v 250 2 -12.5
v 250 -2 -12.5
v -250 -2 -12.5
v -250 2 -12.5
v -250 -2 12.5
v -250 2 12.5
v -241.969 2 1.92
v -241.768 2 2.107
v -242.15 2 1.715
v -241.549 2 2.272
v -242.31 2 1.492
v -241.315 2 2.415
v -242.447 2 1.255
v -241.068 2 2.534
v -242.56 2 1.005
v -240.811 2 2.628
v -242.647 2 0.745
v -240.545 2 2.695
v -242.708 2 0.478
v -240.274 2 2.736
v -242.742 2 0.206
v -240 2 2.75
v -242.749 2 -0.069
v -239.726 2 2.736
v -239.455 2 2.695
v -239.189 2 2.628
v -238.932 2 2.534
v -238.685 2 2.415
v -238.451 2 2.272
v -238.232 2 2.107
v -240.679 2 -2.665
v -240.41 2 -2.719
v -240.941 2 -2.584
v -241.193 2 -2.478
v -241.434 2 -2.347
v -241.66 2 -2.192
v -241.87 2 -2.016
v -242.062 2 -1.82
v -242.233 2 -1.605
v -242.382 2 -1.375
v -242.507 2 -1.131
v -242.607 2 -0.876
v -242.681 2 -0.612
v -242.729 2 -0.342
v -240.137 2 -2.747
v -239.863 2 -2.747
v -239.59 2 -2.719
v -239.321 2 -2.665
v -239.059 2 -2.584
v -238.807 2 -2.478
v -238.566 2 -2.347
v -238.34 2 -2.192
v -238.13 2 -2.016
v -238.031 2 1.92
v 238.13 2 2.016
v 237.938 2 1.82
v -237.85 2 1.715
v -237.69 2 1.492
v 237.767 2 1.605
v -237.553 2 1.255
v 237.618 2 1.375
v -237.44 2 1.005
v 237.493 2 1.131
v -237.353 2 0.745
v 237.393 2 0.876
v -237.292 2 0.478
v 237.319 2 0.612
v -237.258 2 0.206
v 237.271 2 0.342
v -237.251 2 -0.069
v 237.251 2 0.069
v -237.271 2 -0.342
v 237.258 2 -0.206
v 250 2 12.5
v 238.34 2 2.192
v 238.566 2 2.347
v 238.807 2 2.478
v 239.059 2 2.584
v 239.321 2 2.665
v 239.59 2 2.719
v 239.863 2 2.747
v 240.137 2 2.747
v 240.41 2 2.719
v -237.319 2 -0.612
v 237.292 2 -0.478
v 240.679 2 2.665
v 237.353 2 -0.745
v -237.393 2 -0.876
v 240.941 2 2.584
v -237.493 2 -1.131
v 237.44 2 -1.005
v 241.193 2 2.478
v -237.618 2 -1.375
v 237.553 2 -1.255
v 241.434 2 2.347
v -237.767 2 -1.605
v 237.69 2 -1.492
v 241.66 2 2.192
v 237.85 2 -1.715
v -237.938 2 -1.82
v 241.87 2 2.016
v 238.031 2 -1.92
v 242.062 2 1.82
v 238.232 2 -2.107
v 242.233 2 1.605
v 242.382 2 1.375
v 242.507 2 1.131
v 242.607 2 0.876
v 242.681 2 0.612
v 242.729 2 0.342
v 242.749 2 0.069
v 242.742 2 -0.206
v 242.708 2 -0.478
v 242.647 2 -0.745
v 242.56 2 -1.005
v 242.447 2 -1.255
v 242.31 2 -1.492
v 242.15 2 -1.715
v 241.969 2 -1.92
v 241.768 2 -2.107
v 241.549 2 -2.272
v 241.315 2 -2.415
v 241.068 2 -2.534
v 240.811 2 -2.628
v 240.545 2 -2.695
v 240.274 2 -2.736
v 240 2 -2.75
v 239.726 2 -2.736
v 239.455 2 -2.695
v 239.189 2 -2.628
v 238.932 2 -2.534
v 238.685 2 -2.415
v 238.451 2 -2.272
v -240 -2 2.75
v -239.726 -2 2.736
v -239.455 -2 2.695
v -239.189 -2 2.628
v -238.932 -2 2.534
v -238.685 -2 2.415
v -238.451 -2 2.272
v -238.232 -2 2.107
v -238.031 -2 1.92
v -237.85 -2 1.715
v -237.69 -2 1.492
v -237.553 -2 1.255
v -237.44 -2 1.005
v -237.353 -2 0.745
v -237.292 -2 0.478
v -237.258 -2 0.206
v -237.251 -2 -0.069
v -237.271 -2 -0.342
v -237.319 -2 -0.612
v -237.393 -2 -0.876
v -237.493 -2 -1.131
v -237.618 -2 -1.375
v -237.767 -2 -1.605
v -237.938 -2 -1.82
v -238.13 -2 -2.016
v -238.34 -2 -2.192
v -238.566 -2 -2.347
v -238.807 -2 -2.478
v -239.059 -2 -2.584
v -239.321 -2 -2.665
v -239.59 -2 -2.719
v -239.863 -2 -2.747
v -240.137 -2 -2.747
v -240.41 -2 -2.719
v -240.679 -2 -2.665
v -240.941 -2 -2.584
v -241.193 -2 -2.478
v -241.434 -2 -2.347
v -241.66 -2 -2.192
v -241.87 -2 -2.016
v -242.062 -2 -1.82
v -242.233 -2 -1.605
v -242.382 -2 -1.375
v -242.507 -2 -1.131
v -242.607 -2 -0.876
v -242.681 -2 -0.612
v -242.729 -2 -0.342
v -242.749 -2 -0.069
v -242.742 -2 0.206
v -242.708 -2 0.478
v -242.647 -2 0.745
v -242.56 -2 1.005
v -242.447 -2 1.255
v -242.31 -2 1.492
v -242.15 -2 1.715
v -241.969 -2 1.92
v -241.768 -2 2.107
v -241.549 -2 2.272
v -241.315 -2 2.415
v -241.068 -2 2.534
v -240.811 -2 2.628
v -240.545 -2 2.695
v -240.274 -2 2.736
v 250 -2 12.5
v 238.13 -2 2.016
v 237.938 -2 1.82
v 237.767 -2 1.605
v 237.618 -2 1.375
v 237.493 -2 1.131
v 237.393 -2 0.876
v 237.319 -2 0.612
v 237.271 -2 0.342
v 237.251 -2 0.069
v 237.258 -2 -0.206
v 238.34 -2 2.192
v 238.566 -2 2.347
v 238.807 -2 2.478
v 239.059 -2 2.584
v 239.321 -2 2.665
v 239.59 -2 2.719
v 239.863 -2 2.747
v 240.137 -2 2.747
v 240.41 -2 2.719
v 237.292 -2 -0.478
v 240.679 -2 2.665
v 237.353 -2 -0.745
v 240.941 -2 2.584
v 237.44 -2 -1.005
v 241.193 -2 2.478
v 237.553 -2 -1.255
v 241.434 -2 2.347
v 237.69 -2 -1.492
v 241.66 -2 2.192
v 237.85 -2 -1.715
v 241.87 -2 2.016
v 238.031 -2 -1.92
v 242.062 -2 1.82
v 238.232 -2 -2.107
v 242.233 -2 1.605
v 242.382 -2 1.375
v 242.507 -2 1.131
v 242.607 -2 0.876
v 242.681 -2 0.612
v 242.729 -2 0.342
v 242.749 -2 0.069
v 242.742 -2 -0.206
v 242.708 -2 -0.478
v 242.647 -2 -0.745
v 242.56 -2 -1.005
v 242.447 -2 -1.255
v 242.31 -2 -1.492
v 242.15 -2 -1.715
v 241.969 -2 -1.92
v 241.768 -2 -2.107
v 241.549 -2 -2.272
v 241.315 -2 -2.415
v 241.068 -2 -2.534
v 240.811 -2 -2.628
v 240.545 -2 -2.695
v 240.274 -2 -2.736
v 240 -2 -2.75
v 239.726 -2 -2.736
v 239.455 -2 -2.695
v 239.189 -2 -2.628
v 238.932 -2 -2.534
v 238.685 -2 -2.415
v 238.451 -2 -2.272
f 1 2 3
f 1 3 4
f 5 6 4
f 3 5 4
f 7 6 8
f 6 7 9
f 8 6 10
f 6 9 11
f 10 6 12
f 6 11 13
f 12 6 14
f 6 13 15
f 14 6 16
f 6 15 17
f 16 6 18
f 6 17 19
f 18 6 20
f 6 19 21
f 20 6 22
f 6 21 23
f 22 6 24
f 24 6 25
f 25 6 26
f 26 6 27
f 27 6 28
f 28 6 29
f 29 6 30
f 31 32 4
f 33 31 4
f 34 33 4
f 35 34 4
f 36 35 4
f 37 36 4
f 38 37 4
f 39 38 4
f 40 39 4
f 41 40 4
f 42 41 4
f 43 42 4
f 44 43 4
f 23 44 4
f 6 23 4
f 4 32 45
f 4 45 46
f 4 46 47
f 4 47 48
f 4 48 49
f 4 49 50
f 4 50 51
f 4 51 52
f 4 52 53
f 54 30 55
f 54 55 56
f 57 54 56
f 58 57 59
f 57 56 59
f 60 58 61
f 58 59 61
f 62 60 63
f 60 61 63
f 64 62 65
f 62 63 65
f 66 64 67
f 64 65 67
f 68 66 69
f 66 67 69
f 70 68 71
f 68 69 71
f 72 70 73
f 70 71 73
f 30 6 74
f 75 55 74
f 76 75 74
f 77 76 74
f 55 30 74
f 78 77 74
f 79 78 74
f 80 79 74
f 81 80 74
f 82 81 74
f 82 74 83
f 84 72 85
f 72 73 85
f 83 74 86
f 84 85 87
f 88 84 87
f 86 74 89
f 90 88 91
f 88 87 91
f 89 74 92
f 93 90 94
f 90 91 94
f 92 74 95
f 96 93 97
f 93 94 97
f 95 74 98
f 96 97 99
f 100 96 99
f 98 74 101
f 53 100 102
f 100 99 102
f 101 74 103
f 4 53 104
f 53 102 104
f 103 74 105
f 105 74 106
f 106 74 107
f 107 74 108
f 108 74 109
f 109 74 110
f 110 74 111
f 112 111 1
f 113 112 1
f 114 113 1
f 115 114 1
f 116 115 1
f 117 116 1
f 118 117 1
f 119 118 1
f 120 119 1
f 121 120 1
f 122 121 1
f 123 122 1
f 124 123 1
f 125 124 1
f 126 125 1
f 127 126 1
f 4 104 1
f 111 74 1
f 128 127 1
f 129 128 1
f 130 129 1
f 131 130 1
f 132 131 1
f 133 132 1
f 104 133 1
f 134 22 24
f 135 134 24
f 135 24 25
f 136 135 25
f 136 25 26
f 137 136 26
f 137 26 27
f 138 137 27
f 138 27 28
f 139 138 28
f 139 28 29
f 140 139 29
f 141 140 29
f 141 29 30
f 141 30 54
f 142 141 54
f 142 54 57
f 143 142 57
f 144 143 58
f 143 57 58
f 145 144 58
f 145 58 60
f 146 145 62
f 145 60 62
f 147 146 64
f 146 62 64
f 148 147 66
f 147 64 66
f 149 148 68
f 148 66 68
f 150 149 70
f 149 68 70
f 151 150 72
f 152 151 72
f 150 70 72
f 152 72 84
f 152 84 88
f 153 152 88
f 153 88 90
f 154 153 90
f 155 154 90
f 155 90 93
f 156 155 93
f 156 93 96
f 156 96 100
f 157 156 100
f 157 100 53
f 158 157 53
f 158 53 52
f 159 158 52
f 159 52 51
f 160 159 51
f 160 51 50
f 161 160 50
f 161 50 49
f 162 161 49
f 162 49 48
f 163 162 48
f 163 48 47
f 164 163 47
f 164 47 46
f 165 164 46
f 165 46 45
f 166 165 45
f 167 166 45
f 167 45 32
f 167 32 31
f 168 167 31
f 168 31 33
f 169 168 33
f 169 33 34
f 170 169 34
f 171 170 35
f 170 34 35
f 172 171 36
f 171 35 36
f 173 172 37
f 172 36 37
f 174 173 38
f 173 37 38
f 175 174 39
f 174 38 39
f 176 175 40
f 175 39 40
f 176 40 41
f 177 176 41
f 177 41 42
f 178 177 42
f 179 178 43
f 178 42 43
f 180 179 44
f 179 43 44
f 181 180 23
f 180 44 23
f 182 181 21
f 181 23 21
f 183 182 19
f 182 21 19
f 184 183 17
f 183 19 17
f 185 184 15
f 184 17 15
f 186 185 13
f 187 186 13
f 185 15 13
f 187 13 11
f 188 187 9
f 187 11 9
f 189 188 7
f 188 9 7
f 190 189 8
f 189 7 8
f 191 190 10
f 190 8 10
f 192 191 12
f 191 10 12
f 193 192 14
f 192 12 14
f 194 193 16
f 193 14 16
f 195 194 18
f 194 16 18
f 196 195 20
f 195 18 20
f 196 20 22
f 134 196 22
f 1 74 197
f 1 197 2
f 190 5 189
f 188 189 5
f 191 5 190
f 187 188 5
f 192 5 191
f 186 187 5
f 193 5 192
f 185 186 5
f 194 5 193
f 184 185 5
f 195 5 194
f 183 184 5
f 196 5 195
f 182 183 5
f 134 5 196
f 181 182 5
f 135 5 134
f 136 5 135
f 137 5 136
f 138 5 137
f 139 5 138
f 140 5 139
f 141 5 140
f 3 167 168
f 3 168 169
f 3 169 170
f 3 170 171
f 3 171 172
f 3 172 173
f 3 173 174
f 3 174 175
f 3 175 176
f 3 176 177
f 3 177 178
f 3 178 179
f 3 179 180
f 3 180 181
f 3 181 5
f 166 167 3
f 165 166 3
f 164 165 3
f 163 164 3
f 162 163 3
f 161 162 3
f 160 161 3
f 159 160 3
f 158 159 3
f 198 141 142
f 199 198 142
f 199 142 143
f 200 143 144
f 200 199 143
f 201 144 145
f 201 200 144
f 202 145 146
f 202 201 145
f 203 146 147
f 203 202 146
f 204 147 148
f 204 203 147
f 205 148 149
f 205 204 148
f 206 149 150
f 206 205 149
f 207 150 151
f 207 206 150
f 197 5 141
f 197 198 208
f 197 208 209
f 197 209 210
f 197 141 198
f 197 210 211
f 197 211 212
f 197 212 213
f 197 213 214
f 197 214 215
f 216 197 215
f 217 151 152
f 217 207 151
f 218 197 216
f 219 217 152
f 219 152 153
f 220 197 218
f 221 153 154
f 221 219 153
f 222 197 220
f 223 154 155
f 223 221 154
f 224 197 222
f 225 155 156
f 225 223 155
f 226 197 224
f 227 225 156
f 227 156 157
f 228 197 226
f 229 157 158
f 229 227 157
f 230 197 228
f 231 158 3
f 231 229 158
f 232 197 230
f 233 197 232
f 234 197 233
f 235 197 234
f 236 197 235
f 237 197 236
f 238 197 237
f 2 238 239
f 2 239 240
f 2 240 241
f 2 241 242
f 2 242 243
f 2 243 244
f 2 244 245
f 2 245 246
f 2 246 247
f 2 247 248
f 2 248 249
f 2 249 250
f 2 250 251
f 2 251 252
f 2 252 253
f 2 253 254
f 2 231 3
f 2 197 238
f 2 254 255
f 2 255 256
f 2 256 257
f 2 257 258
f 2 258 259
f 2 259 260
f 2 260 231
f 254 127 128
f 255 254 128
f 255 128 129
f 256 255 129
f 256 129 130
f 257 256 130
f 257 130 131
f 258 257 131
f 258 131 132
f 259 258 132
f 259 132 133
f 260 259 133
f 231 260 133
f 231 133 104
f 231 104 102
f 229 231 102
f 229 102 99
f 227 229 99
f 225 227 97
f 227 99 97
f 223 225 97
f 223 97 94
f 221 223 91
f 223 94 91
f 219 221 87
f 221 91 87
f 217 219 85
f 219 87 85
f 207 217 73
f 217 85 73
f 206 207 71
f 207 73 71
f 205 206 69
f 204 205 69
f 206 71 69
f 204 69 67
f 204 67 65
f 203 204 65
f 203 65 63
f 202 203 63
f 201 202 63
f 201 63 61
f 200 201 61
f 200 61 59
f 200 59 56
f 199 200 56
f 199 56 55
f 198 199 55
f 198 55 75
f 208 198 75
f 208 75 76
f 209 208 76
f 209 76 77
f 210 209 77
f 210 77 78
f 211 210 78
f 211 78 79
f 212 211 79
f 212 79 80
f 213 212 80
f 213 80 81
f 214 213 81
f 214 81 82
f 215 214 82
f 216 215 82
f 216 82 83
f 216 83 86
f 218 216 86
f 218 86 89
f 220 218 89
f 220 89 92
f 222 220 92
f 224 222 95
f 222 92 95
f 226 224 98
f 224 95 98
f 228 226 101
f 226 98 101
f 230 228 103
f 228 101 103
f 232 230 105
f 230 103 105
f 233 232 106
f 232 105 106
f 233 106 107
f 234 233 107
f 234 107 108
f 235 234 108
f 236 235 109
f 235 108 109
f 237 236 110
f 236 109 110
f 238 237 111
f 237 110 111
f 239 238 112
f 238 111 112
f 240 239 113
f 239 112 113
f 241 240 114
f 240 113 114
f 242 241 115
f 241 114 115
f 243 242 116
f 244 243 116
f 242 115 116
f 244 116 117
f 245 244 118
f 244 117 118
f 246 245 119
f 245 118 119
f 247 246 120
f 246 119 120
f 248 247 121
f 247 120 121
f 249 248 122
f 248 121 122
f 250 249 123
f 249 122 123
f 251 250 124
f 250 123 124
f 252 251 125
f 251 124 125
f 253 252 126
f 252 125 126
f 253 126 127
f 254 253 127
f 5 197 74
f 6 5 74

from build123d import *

# Parameters (mm, degrees)
SKETCH1_W           = 25
SKETCH1_H           = 4
BOSS_EXTRUDE1_DEPTH = 250
SKETCH2_R           = 2.75
CUT_EXTRUDE1_DEPTH  = 251.344262966


with BuildPart() as part:
    # Sketch1 → Boss-Extrude1 (new, symmetric)
    with BuildSketch(Plane(origin=(0, 0, 0), x_dir=(0, 0, -1), z_dir=(1, 0, 0))):
        Rectangle(SKETCH1_W, SKETCH1_H)
    extrude(amount=BOSS_EXTRUDE1_DEPTH, both=True)

    # Sketch2 → Cut-Extrude1 (cut, through all)
    with BuildSketch(Plane(origin=(0, 2, 0), x_dir=(1, 0, 0), z_dir=(0, 1, 0))):
        with Locations(Location((-240, 0, 0), (0, 0, 270))):
            Circle(SKETCH2_R)
        with Locations(Location((240, 0, 0), (0, 0, 90))):
            Circle(SKETCH2_R)
    extrude(amount=-CUT_EXTRUDE1_DEPTH, mode=Mode.SUBTRACT)


solid = part.part
